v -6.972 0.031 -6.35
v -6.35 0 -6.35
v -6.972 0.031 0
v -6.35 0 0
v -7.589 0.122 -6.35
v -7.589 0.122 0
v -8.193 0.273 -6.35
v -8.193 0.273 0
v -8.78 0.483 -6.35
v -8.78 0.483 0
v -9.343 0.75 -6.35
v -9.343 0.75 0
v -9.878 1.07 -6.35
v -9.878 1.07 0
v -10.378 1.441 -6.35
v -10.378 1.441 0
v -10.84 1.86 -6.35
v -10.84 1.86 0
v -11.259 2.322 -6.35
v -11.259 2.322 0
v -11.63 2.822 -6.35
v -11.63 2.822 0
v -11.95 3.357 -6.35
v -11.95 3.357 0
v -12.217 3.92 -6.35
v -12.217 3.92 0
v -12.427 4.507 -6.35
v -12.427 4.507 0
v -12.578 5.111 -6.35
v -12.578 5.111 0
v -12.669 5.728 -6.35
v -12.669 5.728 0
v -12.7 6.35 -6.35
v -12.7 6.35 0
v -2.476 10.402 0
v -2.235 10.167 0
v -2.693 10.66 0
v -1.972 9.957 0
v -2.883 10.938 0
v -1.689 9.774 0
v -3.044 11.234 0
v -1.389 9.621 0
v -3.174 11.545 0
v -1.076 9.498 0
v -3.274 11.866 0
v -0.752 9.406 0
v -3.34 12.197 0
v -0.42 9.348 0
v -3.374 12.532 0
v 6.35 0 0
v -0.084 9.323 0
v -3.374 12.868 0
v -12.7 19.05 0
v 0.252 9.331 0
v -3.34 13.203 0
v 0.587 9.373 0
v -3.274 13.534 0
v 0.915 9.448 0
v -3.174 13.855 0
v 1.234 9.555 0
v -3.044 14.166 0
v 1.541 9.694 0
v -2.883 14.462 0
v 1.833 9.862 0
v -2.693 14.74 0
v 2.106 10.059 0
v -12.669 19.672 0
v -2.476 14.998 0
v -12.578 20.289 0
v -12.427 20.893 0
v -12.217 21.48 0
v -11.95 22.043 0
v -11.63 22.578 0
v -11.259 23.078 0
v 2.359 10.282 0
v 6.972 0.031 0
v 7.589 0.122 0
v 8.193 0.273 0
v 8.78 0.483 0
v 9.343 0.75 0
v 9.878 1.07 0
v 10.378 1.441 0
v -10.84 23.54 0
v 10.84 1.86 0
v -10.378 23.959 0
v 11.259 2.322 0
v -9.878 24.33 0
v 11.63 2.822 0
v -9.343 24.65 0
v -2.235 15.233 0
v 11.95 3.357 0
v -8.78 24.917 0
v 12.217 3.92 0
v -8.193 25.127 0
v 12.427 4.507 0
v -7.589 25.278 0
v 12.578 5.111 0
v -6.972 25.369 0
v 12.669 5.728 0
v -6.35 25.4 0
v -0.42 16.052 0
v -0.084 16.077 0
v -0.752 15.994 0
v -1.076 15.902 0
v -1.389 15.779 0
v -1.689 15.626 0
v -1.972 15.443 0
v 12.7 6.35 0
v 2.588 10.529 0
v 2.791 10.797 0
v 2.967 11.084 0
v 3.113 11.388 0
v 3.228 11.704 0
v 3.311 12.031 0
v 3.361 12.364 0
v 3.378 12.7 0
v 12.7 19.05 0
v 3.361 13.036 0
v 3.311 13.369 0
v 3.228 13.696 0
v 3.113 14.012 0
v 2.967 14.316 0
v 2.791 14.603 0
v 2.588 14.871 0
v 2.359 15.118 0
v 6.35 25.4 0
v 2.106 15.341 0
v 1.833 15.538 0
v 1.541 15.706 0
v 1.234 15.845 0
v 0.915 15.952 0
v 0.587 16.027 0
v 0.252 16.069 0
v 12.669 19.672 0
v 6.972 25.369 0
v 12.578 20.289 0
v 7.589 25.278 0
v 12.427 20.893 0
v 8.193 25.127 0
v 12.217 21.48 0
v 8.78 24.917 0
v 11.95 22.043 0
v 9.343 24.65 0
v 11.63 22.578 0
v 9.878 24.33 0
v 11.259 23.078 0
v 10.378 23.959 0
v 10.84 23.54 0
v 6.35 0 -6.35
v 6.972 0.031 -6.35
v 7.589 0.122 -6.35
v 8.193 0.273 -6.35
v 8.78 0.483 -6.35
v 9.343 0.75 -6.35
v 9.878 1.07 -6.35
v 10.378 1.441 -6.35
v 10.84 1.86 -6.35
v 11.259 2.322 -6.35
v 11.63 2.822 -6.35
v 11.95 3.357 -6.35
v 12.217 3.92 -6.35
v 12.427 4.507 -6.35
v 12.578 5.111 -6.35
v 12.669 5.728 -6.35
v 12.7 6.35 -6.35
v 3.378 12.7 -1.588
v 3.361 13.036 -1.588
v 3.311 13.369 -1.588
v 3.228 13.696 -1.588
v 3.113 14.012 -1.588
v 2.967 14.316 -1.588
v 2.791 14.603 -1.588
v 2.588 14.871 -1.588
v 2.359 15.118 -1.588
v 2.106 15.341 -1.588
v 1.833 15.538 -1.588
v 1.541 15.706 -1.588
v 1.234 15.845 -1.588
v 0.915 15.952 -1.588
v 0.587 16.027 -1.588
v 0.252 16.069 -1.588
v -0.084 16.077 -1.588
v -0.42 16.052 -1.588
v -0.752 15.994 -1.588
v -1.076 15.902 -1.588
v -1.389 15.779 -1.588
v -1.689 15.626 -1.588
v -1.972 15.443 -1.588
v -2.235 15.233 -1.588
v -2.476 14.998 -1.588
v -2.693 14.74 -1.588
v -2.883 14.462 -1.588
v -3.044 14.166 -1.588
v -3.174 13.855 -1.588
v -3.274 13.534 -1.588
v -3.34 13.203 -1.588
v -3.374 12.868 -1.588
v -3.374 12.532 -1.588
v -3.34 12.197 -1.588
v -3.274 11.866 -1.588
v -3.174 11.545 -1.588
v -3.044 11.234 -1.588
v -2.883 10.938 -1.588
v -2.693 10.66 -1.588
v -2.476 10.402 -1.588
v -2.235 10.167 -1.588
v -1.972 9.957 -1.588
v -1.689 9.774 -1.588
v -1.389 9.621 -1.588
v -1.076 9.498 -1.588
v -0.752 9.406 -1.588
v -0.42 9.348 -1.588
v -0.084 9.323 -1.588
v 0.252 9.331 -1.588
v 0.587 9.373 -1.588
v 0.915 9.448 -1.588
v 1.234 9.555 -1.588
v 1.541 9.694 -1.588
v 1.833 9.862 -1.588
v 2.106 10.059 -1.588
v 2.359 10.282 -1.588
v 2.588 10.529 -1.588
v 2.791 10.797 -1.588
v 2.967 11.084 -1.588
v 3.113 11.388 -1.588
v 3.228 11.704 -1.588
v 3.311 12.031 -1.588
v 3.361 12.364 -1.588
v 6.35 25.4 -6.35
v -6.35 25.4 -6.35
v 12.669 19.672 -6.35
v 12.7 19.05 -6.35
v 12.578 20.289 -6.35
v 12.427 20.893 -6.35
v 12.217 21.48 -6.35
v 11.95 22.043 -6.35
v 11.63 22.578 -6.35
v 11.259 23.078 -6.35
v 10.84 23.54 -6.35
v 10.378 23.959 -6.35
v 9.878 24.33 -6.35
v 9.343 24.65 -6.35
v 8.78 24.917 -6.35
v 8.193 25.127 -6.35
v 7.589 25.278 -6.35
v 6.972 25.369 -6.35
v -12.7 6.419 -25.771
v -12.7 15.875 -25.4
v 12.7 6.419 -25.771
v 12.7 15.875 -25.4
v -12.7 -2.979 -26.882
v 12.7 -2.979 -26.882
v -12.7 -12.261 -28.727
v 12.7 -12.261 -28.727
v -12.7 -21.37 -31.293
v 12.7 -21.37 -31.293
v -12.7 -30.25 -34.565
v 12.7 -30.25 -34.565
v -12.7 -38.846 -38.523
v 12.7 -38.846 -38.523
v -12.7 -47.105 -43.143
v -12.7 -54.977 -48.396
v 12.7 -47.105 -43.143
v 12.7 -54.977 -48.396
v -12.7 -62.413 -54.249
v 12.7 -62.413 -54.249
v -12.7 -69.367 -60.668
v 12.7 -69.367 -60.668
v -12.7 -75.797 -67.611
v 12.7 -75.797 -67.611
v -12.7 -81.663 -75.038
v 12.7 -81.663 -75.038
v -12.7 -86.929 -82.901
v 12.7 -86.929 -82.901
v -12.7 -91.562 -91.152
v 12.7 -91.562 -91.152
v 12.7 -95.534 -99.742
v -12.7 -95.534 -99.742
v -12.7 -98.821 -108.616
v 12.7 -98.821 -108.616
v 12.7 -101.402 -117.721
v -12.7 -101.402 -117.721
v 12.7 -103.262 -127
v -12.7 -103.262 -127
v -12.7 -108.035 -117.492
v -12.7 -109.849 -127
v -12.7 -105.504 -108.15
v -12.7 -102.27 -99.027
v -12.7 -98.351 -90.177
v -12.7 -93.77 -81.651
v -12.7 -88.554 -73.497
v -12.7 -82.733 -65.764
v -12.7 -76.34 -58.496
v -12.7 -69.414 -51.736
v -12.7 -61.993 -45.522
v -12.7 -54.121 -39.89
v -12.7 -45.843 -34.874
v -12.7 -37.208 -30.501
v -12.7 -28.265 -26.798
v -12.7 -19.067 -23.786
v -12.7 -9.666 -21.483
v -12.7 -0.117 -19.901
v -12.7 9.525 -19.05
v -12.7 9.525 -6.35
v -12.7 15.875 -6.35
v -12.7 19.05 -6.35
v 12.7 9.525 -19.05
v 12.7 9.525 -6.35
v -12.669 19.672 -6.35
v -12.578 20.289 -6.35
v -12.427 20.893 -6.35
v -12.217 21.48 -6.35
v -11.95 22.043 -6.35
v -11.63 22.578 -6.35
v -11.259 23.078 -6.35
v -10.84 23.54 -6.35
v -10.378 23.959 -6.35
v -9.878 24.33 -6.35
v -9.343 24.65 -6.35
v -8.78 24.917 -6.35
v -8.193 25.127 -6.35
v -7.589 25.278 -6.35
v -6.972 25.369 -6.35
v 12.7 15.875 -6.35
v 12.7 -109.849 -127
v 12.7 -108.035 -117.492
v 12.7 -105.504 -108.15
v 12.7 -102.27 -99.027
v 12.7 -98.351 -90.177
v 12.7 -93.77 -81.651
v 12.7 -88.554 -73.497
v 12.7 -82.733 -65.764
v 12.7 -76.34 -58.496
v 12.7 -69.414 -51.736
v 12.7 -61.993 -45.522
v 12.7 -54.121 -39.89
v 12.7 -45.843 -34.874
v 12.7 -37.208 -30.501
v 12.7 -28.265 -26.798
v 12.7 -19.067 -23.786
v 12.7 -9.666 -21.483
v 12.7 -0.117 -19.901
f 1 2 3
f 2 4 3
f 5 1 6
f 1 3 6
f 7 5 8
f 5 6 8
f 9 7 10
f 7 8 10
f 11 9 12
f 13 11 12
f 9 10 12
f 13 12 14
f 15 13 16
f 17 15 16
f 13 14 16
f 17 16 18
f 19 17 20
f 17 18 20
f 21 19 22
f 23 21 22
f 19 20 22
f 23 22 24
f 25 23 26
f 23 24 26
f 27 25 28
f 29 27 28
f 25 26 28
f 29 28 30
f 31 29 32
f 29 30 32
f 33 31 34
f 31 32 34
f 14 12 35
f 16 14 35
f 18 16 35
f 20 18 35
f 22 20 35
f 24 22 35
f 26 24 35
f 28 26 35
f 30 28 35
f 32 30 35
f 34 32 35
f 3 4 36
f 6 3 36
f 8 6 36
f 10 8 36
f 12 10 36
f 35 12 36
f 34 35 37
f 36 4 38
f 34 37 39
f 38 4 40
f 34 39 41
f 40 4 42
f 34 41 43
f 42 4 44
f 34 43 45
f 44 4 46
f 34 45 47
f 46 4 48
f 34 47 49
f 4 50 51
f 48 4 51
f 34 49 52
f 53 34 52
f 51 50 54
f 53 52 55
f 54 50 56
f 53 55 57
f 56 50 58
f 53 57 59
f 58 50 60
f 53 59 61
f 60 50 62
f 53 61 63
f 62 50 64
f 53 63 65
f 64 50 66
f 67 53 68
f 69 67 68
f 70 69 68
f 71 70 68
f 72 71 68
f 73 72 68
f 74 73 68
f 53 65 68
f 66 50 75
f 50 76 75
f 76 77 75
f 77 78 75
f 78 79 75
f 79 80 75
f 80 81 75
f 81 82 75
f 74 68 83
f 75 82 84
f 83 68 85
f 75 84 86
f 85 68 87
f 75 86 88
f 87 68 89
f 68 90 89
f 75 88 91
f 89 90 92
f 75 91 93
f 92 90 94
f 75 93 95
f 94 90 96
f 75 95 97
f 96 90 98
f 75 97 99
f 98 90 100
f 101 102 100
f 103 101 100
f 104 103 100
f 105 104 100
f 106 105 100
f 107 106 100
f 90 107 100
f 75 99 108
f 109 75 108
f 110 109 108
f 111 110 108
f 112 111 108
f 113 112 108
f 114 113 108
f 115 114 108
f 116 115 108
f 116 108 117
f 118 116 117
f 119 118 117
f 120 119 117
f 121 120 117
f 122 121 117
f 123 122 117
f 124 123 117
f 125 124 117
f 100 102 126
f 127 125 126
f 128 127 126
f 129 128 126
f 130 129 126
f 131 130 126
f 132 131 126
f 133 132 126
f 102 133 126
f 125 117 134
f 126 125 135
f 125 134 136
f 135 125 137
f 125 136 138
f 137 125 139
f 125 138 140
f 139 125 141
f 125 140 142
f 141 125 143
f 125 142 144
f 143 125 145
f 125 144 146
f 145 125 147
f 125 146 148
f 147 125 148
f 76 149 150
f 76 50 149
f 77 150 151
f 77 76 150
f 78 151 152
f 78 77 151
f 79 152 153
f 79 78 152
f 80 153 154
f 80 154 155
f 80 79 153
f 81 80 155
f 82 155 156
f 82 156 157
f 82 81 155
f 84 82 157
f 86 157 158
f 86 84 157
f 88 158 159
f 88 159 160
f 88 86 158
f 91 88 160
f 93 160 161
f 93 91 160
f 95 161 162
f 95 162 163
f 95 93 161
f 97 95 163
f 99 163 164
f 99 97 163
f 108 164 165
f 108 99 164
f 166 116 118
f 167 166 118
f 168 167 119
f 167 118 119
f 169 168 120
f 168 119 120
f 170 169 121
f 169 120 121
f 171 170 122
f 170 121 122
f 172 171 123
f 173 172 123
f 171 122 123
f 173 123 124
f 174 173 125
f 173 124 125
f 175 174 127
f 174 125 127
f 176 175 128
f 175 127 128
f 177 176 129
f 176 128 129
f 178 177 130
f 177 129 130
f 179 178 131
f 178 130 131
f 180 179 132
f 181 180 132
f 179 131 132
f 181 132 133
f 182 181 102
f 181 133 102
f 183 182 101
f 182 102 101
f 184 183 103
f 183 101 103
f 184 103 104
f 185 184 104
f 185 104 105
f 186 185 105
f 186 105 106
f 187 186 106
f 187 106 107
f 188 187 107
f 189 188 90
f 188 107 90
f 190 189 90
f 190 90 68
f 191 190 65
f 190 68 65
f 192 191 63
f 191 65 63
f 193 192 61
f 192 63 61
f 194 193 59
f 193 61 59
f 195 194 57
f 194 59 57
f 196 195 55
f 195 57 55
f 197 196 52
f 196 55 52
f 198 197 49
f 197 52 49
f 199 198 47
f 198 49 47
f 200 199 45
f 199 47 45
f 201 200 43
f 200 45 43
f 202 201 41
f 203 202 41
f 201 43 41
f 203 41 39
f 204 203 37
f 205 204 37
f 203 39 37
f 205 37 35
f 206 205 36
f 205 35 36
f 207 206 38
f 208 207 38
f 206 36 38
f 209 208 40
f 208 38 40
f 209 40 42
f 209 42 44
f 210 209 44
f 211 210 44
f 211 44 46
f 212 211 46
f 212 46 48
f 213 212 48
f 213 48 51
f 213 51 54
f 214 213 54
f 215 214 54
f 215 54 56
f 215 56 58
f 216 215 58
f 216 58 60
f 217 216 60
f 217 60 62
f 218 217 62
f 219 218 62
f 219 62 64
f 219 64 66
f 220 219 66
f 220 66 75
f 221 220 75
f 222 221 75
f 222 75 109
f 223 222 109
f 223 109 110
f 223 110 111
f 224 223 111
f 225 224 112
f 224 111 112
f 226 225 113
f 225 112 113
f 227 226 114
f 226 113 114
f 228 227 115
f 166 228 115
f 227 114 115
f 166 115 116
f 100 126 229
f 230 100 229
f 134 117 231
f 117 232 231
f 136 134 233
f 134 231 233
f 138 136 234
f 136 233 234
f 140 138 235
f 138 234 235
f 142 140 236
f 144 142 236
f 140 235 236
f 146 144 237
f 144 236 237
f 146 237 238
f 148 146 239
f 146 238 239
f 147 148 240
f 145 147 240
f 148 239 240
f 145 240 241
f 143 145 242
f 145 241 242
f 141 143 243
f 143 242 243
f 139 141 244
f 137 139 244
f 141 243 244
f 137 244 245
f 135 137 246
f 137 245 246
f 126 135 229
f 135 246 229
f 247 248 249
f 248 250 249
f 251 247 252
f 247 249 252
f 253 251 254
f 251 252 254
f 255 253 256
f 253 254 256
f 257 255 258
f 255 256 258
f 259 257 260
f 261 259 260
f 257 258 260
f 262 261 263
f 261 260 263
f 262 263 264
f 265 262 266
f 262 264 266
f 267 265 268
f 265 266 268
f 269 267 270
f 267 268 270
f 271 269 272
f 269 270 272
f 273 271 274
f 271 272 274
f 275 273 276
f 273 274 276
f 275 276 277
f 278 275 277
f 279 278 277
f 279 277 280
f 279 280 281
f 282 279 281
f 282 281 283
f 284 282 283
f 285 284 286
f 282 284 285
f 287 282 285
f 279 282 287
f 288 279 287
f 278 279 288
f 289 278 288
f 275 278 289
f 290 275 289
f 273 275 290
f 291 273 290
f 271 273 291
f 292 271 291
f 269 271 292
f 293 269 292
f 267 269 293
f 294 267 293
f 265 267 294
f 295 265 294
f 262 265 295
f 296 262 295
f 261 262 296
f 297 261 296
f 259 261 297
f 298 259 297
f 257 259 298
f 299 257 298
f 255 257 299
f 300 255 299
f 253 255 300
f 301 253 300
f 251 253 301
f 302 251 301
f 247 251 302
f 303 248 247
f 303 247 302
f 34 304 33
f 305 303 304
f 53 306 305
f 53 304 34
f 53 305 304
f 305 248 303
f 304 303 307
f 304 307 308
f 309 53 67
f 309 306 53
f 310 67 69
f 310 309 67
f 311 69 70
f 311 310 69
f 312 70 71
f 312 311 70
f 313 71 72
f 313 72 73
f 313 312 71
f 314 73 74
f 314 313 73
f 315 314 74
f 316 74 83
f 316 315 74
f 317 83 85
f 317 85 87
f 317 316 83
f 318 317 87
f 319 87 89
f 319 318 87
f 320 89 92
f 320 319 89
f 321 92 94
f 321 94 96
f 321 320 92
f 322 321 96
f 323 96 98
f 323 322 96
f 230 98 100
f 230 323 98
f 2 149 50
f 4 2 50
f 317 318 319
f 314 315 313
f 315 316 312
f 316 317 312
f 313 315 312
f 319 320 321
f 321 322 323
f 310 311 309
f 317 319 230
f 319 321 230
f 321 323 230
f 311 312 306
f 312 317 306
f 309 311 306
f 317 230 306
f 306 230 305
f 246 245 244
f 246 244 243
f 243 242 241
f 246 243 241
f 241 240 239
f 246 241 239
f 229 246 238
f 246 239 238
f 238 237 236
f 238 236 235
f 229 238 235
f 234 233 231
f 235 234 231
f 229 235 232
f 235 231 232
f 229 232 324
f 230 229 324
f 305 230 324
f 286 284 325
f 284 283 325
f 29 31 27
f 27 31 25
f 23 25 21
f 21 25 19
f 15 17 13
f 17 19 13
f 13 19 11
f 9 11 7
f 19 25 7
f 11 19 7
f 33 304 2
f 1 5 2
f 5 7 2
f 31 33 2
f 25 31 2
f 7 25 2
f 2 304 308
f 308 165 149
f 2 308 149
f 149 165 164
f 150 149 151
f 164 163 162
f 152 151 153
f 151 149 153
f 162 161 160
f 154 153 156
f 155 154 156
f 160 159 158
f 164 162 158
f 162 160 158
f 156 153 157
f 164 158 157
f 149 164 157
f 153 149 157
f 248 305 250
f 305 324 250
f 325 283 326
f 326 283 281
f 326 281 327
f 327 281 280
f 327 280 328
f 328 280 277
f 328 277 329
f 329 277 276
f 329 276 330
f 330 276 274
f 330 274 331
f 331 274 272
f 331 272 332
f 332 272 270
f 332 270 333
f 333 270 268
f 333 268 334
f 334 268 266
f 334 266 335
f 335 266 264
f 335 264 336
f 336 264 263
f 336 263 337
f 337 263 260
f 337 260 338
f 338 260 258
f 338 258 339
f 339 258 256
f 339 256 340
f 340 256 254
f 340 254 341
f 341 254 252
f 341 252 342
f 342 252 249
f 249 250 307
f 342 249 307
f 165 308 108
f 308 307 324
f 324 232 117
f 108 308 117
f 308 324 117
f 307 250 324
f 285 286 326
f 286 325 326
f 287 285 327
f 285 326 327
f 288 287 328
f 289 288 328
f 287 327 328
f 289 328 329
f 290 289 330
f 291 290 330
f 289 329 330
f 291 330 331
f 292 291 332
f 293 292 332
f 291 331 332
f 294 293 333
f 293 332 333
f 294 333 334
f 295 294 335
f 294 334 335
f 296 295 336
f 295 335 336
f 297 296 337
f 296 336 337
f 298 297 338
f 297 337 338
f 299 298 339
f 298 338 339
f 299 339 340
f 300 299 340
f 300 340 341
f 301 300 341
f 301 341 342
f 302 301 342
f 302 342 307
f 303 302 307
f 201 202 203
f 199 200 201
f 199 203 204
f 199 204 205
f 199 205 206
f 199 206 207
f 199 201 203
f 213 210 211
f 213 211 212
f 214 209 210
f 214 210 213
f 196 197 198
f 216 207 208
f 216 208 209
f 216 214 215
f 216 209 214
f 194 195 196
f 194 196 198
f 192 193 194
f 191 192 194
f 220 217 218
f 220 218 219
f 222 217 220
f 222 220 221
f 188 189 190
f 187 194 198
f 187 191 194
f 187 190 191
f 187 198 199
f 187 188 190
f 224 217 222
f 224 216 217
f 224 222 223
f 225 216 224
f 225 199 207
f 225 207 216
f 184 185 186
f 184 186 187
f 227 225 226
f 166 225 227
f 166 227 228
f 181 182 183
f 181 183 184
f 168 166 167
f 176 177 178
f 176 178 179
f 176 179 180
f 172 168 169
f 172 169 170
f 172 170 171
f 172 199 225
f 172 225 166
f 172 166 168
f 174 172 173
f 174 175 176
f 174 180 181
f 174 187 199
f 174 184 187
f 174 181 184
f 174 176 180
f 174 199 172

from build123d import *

# Parameters (mm, degrees)
BOSS_EXTRUDE1_DEPTH = 12.7
SKETCH2_R           = 3.3782
CUT_EXTRUDE1_DEPTH  = 1.5875
FILLET2_R           = 6.35


with BuildPart() as part:
    # Sketch1 → Boss-Extrude1 (new body, symmetric)
    with BuildSketch(Plane(origin=(0, 0, 0), x_dir=(0, 0, -1), z_dir=(1, 0, 0))):
        with BuildLine():
            Line((0, 0), (0, 25.4))
            Line((0, 25.4), (6.35, 25.4))
            Line((6.35, 25.4), (6.35, 15.875))
            Line((6.35, 15.875), (25.4, 15.875))
            ThreePointArc((25.4, 15.875), (54.249114928, -62.413057838), (127, -103.2615603))
            Line((127, -103.2615603), (127, -109.848585695))
            ThreePointArc((127, -109.848585695), (51.735823624, -69.413678232), (19.05, 9.525))
            Line((19.05, 9.525), (6.35, 9.525))
            Line((6.35, 9.525), (6.35, 0))
            Line((6.35, 0), (0, 0))
        make_face()
    extrude(amount=BOSS_EXTRUDE1_DEPTH, both=True)

    # Sketch2 → Cut-Extrude1 (cut)
    with BuildSketch(Plane.XY):
        with Locations((0, 12.7)):
            Circle(SKETCH2_R)
    extrude(amount=-CUT_EXTRUDE1_DEPTH, mode=Mode.SUBTRACT)

    # Fillet2
    fillet2_edges = [part.edges().sort_by_distance(p)[0] for p in [
        (-12.7, 25.4, -3.175),
        (-12.7, 0, -3.175),
        (12.7, 25.4, -3.175),
        (12.7, 0, -3.175),
    ]]
    fillet(fillet2_edges, radius=FILLET2_R)


solid = part.part
